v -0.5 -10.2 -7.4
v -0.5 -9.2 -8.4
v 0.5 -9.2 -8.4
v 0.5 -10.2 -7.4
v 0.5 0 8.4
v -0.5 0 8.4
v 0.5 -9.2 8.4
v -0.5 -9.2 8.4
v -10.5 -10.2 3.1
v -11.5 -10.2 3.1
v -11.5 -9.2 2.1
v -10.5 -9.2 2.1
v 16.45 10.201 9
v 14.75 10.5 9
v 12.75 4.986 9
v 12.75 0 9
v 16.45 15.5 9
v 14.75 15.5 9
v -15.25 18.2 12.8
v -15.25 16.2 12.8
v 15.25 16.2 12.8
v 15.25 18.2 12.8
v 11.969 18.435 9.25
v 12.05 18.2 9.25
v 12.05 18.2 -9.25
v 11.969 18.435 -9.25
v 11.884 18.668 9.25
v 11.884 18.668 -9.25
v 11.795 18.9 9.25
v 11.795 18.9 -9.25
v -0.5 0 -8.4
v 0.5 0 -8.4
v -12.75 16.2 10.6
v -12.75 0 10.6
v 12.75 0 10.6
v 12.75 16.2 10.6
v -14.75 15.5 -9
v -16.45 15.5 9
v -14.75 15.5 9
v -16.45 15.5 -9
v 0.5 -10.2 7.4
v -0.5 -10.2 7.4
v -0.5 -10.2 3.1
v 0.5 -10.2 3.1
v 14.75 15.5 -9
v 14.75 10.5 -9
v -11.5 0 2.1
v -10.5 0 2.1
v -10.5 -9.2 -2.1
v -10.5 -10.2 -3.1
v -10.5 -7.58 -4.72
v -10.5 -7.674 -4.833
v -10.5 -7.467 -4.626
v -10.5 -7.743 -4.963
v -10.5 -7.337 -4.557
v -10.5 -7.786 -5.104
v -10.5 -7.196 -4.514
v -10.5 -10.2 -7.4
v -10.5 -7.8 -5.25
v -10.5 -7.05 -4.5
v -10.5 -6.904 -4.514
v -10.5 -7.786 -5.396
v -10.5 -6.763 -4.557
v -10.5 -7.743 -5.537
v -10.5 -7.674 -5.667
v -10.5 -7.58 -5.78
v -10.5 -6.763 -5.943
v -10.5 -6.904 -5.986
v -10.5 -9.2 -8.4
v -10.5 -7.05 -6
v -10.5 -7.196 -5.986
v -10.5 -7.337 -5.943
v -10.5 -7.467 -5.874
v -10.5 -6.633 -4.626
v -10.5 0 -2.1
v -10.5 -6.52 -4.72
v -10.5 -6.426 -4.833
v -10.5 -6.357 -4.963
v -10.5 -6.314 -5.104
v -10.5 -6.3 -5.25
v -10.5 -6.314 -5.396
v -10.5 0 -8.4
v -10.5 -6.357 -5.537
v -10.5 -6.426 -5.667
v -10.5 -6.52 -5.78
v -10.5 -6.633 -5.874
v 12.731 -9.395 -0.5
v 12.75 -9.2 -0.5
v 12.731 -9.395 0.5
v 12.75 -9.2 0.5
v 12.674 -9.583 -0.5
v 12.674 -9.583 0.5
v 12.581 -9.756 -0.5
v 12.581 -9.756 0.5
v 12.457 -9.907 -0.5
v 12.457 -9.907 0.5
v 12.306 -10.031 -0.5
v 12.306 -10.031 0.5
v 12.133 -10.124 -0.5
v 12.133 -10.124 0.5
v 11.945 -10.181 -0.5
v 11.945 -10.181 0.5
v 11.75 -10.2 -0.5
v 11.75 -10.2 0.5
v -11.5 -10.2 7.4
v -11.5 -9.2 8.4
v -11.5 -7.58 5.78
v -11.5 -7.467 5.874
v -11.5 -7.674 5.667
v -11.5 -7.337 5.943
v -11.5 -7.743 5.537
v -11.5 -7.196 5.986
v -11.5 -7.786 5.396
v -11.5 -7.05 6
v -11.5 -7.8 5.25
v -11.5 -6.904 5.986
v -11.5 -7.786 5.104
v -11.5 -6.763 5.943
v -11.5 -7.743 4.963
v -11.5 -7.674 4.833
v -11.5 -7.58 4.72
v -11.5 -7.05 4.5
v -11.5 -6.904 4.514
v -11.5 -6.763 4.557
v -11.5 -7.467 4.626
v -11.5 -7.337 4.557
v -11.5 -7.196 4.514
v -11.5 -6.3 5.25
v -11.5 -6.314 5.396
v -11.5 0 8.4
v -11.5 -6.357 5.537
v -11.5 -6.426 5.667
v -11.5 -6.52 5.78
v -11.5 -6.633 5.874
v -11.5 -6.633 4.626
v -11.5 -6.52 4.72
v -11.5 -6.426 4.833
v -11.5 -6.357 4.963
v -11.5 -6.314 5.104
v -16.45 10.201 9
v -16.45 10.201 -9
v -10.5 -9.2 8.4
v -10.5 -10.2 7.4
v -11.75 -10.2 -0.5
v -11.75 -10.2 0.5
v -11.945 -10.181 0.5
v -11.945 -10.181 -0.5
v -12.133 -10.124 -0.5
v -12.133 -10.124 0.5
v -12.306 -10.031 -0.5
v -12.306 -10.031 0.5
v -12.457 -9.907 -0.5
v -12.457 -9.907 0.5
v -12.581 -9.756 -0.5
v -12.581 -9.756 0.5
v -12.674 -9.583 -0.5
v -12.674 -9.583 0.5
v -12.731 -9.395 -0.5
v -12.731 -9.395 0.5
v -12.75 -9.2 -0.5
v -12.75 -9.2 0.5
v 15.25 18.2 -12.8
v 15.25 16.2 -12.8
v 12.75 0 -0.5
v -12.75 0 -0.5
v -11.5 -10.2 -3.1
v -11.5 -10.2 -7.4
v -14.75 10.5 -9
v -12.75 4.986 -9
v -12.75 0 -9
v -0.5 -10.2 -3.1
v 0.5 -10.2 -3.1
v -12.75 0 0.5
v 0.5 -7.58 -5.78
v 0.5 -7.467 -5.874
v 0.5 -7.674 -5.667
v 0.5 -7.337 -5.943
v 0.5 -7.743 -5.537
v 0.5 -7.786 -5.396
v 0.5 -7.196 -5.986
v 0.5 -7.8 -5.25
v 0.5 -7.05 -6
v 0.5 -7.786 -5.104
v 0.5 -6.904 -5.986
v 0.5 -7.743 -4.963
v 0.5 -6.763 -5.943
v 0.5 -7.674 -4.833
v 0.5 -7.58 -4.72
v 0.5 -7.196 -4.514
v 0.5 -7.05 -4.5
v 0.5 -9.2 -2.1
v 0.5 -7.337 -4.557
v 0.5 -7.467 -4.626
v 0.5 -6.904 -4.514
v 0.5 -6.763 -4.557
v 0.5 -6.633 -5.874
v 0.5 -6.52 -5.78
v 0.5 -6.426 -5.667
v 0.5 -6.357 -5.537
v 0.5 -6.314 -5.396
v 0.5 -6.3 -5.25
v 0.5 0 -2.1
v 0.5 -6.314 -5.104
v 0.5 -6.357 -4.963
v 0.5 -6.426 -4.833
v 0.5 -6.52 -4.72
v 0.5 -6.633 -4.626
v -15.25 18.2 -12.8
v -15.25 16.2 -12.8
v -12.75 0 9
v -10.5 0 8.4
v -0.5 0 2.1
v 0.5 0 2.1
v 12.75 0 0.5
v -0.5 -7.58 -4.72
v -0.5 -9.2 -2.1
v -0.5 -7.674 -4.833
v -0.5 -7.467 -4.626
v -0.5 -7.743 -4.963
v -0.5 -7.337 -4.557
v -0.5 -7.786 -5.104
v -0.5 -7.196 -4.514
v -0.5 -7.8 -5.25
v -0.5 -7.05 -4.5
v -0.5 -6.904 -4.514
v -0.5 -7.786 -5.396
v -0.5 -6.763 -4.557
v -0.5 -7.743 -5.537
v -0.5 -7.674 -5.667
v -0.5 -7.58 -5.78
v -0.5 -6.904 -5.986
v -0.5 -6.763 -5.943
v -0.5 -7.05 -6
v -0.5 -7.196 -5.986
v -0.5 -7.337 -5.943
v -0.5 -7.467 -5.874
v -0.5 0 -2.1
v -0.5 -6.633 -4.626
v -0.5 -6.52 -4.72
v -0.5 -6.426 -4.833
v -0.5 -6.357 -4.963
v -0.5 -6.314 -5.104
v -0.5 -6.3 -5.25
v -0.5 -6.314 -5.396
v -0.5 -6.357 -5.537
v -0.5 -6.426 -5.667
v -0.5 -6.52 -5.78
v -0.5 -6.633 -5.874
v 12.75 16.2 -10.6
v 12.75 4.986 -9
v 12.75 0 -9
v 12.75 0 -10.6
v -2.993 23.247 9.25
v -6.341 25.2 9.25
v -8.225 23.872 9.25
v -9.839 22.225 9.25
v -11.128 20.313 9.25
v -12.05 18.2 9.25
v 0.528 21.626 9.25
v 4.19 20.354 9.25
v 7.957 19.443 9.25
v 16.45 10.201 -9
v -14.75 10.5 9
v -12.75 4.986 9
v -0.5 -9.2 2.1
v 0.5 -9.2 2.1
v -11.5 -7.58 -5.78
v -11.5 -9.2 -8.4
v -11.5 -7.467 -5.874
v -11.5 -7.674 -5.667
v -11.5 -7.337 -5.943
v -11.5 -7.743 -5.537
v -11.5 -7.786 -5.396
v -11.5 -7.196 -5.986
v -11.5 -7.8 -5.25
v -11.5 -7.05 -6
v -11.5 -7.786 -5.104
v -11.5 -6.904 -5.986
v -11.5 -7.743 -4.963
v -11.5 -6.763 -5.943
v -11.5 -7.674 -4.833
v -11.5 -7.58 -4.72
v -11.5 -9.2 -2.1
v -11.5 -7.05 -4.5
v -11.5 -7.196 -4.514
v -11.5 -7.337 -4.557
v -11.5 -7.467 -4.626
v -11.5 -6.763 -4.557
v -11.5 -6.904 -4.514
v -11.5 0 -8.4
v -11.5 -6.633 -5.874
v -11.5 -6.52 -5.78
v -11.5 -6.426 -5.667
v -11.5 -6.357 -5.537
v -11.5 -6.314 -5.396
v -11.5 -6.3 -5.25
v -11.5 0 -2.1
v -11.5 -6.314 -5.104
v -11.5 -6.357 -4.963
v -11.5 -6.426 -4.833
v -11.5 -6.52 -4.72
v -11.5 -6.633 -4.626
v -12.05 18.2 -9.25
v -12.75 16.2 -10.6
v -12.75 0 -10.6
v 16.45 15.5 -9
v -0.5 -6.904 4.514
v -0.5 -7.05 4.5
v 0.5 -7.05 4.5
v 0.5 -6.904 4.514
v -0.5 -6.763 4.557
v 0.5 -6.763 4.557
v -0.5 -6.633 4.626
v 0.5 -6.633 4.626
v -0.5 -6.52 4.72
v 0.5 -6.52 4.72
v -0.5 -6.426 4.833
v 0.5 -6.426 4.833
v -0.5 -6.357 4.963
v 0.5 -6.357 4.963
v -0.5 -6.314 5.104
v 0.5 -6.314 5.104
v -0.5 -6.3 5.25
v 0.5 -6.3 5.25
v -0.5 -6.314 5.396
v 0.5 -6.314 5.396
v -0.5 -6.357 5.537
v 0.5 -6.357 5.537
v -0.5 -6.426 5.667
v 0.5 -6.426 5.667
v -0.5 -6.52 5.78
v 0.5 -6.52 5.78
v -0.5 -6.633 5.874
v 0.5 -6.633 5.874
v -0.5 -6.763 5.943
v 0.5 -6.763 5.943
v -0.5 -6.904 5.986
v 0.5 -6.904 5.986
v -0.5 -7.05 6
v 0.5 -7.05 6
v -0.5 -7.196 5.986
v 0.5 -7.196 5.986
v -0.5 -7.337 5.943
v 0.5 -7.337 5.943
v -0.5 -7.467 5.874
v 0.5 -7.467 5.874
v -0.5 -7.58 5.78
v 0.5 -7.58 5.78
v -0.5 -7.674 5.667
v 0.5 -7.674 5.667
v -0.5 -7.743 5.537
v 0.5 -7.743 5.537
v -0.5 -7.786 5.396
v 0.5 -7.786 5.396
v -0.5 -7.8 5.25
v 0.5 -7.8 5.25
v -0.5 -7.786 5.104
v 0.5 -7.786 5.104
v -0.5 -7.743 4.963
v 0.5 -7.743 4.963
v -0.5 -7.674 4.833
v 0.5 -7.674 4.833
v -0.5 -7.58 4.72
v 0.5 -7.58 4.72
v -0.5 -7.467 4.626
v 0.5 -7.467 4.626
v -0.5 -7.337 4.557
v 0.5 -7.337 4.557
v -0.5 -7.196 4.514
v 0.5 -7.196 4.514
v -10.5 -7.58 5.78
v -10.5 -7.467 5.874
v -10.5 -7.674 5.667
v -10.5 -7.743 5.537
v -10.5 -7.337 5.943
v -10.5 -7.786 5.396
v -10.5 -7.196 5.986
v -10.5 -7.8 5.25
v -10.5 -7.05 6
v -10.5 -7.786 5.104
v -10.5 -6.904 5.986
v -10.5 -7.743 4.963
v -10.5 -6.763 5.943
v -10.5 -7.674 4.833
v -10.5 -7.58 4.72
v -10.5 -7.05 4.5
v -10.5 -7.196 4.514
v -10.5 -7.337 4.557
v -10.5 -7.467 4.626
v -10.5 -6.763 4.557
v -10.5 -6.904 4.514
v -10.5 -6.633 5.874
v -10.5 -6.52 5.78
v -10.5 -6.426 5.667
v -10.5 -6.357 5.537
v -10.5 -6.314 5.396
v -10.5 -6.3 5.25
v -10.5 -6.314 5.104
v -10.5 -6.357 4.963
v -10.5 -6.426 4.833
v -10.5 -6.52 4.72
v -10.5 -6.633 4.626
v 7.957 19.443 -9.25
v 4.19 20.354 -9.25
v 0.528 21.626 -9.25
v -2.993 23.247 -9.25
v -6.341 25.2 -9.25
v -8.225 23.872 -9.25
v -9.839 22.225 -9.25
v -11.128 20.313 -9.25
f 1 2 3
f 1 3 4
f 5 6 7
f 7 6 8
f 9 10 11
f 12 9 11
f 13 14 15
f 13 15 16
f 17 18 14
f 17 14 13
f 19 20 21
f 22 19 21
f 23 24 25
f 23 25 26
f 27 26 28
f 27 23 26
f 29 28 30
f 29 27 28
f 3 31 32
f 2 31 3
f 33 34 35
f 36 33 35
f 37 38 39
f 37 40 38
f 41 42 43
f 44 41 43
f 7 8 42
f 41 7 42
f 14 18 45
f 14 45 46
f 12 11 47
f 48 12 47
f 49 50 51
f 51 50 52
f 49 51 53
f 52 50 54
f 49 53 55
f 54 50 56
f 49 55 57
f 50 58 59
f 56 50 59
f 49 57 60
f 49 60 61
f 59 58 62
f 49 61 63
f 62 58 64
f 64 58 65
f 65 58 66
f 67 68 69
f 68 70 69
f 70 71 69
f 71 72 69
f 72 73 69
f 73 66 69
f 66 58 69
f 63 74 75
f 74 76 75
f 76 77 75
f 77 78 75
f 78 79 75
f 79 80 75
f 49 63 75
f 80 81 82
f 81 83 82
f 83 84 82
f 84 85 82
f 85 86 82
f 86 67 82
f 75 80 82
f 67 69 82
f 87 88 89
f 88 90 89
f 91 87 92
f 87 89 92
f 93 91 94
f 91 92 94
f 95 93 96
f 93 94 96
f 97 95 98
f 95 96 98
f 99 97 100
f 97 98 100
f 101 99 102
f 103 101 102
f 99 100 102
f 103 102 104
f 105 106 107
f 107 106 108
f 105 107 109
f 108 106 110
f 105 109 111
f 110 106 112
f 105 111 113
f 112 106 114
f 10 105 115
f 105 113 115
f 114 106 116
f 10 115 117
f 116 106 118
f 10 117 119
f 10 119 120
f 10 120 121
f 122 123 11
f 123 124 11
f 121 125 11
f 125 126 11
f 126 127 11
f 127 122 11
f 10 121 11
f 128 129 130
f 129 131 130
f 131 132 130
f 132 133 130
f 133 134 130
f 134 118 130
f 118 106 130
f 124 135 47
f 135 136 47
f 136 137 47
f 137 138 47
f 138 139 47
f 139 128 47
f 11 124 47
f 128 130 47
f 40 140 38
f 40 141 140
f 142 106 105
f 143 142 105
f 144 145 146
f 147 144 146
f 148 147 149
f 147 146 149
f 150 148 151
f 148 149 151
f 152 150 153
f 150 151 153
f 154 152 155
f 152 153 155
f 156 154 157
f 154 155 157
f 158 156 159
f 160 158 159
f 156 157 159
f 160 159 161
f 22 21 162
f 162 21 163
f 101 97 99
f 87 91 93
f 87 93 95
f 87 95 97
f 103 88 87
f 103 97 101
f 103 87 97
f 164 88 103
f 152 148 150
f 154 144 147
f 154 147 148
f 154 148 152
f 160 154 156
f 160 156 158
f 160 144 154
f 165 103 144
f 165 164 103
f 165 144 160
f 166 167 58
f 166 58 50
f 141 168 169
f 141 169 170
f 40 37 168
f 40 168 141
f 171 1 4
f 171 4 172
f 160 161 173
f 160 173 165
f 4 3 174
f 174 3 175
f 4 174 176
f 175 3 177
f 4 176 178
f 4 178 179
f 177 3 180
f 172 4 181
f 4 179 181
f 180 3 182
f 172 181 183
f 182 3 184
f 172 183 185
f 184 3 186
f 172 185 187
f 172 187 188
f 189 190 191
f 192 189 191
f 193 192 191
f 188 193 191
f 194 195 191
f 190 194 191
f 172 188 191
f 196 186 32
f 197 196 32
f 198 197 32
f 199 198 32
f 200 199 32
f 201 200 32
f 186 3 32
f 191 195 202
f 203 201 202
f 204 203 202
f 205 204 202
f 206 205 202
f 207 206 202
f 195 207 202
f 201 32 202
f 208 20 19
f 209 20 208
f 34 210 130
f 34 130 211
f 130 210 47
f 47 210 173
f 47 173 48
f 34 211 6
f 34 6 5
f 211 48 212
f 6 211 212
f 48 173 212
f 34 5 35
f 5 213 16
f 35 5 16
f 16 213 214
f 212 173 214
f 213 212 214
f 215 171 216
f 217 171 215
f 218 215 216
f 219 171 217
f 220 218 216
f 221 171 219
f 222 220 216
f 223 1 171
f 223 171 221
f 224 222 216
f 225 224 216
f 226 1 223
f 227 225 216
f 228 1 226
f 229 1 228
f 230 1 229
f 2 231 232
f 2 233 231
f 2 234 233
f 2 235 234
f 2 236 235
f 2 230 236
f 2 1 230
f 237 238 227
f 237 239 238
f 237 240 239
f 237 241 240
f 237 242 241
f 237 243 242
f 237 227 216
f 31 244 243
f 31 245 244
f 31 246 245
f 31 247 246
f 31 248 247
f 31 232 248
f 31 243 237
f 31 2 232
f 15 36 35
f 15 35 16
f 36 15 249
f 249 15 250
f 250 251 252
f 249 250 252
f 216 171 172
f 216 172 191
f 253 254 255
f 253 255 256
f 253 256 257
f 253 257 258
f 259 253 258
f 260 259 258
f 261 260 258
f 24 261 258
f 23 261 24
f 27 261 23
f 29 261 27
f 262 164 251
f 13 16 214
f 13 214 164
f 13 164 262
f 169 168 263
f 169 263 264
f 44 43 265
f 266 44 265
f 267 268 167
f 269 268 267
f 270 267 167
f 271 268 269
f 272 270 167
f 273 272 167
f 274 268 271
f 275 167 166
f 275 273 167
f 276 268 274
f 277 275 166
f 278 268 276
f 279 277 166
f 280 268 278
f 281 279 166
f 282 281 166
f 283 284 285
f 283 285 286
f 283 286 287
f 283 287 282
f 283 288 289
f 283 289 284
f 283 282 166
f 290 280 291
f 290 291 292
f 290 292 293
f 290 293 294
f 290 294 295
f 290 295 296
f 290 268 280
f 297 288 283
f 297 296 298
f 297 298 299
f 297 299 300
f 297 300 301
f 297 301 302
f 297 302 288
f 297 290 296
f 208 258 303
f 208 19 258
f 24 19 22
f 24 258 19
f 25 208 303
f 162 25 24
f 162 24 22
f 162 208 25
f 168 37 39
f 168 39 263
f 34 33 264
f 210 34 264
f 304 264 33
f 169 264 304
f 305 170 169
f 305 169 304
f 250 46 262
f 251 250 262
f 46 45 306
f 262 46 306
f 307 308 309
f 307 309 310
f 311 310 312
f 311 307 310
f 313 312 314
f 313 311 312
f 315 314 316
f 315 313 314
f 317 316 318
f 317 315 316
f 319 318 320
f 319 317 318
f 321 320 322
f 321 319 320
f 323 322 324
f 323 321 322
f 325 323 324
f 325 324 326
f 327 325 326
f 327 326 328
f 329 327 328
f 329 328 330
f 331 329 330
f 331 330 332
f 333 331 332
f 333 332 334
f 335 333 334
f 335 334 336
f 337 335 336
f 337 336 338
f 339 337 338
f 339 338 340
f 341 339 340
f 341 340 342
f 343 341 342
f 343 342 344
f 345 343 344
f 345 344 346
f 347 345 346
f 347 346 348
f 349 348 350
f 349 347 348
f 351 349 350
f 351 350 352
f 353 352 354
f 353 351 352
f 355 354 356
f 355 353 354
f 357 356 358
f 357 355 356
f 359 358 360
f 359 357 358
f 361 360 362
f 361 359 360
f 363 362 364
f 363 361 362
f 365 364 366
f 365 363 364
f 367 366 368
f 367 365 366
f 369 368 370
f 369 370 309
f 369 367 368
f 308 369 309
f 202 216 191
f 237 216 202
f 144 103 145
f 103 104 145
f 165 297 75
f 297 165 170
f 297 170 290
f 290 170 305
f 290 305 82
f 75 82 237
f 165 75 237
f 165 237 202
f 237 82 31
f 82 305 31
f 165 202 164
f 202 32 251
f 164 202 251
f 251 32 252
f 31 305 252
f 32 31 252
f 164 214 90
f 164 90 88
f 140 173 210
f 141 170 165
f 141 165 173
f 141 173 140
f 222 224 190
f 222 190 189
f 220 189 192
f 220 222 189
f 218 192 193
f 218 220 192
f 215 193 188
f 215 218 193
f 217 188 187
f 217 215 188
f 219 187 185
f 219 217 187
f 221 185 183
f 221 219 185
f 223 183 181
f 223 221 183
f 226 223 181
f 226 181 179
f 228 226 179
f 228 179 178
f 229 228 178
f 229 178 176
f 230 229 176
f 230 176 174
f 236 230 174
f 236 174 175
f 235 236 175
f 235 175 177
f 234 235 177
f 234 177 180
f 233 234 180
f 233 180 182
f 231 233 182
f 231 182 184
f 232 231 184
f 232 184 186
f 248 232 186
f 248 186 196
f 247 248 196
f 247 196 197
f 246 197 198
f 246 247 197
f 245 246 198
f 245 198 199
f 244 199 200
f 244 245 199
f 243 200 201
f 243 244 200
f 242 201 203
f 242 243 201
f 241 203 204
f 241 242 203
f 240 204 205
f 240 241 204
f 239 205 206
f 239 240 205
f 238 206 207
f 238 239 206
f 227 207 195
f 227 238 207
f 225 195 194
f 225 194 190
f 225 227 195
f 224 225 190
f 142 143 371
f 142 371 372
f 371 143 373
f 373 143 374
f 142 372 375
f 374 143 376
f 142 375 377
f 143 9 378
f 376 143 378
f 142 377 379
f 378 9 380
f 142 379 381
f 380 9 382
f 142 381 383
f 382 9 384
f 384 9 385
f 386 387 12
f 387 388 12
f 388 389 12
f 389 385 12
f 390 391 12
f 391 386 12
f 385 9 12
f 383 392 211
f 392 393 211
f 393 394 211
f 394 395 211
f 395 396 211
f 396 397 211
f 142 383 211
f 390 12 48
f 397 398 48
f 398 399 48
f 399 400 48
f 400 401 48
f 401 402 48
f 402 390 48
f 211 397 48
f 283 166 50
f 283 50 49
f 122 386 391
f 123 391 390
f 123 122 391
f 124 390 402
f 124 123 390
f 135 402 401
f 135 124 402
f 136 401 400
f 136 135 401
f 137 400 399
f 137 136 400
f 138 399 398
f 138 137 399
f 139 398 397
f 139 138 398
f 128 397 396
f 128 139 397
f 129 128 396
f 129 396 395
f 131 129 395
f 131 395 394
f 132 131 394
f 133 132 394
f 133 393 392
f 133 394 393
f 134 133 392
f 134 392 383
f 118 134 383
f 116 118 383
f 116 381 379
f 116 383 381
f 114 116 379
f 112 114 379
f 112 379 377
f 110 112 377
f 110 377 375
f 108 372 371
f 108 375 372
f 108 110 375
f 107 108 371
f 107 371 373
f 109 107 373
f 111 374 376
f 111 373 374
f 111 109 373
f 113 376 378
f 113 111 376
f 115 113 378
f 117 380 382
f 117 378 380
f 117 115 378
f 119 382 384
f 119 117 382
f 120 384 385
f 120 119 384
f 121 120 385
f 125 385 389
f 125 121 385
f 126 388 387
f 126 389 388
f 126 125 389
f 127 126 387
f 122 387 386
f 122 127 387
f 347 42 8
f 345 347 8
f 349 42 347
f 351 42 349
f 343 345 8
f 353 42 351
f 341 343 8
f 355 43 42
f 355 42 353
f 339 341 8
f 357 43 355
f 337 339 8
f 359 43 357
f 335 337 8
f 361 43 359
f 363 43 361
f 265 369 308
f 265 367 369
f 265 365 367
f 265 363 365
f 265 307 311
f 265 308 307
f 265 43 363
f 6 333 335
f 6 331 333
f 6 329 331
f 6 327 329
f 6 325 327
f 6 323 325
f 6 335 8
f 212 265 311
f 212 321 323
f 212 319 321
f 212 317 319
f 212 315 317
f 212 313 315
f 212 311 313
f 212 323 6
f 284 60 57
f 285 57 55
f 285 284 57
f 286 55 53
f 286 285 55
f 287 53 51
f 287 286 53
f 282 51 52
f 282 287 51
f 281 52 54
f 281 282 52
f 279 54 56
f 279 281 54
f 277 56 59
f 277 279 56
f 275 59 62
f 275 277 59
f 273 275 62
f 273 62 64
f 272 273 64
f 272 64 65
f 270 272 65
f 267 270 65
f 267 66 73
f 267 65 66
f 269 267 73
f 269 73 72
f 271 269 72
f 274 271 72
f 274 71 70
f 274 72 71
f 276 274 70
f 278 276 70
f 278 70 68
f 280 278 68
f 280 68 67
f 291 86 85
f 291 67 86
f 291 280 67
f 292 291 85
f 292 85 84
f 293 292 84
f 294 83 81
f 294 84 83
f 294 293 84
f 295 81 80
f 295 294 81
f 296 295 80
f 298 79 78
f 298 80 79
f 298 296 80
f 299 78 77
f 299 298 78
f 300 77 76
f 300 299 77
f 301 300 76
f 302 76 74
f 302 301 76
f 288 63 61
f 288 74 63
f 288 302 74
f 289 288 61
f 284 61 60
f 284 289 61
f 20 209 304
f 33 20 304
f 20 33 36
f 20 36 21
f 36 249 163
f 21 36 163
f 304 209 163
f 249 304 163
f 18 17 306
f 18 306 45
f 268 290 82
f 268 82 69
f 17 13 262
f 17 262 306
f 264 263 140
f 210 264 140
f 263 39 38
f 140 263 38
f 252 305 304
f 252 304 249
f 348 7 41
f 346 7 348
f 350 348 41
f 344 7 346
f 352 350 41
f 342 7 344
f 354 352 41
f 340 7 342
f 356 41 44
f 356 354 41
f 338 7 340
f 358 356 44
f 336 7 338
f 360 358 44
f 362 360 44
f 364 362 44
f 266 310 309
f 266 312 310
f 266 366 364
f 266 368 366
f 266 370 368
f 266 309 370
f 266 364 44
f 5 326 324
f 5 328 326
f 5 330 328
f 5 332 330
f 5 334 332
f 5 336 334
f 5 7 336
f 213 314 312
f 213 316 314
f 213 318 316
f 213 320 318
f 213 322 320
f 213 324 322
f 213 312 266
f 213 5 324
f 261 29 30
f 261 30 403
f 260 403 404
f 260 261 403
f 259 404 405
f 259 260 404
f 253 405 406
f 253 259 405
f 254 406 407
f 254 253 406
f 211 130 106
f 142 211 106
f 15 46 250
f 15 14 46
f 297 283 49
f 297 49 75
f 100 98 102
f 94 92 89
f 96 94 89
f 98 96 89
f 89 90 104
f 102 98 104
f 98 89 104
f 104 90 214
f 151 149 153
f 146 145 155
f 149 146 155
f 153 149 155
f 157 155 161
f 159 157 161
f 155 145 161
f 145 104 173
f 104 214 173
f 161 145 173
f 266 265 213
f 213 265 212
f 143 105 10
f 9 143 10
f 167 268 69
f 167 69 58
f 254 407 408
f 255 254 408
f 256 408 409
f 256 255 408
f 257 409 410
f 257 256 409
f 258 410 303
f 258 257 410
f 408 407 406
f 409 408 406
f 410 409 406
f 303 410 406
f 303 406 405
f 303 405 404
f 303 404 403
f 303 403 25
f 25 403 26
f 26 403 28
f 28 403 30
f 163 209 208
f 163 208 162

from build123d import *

# Parameters (mm, degrees)
SKETCH1_W                = 25.5
SKETCH1_H                = 21.2
BOSS_EXTRUDE1_DEPTH      = 16.2
SKETCH3_W                = 30.5
SKETCH3_H                = 25.6
BOSS_EXTRUDE2_DEPTH      = 2
BOSS_EXTRUDE3_DEPTH      = 9.25
BOSS_EXTRUDE4_DEPTH      = 0.5
BOSS_EXTRUDE4_DEPTH_BACK = 11.5
SKETCH6_R                = 0.75
CUT_EXTRUDE1_DEPTH       = 37.291080171
CUT_EXTRUDE1_DEPTH_BACK  = 37.291080171
SKETCH7_W                = 10
SKETCH7_H                = 10.2
BOSS_EXTRUDE5_DEPTH      = 0.5
BOSS_EXTRUDE6_DEPTH      = 9


with BuildPart() as part:
    # Sketch1 → Boss-Extrude1 (new body)
    with BuildSketch(Plane(origin=(0, 0, 0), x_dir=(1, 0, 0), z_dir=(0, 1, 0))):
        Rectangle(SKETCH1_W, SKETCH1_H)
    extrude(amount=BOSS_EXTRUDE1_DEPTH)

    # Sketch3 → Boss-Extrude2 (add)
    with BuildSketch(Plane(origin=(0, 16.2, 0), x_dir=(1, 0, 0), z_dir=(0, 1, 0))):
        Rectangle(SKETCH3_W, SKETCH3_H)
    extrude(amount=BOSS_EXTRUDE2_DEPTH)

    # Sketch4 → Boss-Extrude3 (add, symmetric)
    with BuildSketch(Plane.XY):
        with BuildLine():
            Line((-12.05, 18.2), (12.05, 18.2))
            ThreePointArc((12.05, 18.2), (11.927434436, 18.551874053), (11.79459622, 18.9))
            ThreePointArc((11.79459622, 18.9), (2.343455936, 20.945857513), (-6.340544141, 25.2))
            ThreePointArc((-6.340544141, 25.2), (-9.838853005, 22.224928134), (-12.05, 18.2))
        make_face()
    extrude(amount=BOSS_EXTRUDE3_DEPTH, both=True)

    # Sketch6 → Boss-Extrude4 (add, two sides: drawn at the far end of the back side and taken through both)
    # profile 1 of 2: a face of its own
    with BuildSketch(Plane(origin=(0, 0, 0), x_dir=(0, 0, -1), z_dir=(1, 0, 0)).offset(-BOSS_EXTRUDE4_DEPTH_BACK)):
        Polygon((-8.4, 0), (-8.4, -9.2), (-7.4, -10.2), (-3.1, -10.2), (-2.1, -9.2), (-2.1, 0), align=None)
        with Locations((-5.25, -7.05)):
            Circle(SKETCH6_R, mode=Mode.SUBTRACT)
    # profile 2 of 2: a face of its own
    with BuildSketch(Plane(origin=(0, 0, 0), x_dir=(0, 0, -1), z_dir=(1, 0, 0)).offset(-BOSS_EXTRUDE4_DEPTH_BACK)):
        Polygon((2.1, -9.2), (2.1, 0), (8.4, 0), (8.4, -9.2), (7.4, -10.2), (3.1, -10.2), align=None)
        with Locations(Location((5.25, -7.05, 0), (0, 0, 180))):
            Circle(SKETCH6_R, mode=Mode.SUBTRACT)
    extrude(amount=BOSS_EXTRUDE4_DEPTH + BOSS_EXTRUDE4_DEPTH_BACK)

    # Sketch7 → Cut-Extrude1 (cut, two sides: drawn at the far end of the back side and taken through both)
    with BuildSketch(Plane.XY.offset(8.4).offset(-CUT_EXTRUDE1_DEPTH_BACK)):
        with Locations((-5.5, -5.1)):
            Rectangle(SKETCH7_W, SKETCH7_H)
    extrude(amount=CUT_EXTRUDE1_DEPTH + CUT_EXTRUDE1_DEPTH_BACK, mode=Mode.SUBTRACT)

    # Sketch8 → Boss-Extrude5 (add, symmetric)
    with BuildSketch(Plane.XY):
        with BuildLine():
            Line((-12.75, 0), (12.75, 0))
            Line((12.75, 0), (12.75, -9.2))
            ThreePointArc((12.75, -9.2), (12.457106781, -9.907106781), (11.75, -10.2))
            Line((11.75, -10.2), (-11.75, -10.2))
            ThreePointArc((-11.75, -10.2), (-12.457106781, -9.907106781), (-12.75, -9.2))
            Line((-12.75, -9.2), (-12.75, 0))
        make_face()
    extrude(amount=BOSS_EXTRUDE5_DEPTH, both=True)

    # Sketch9 → Boss-Extrude6 (add, symmetric)
    with BuildSketch(Plane.XY):
        Polygon((-16.45, 15.5), (-14.75, 15.5), (-14.75, 10.5), (-12.75, 4.985823609), (-12.75, 0), (-16.45, 10.201226322), align=None)
        Polygon((12.75, 0), (16.45, 10.201226322), (16.45, 15.5), (14.75, 15.5), (14.75, 10.5), (12.75, 4.985823609), align=None)
    extrude(amount=BOSS_EXTRUDE6_DEPTH, both=True)


solid = part.part
